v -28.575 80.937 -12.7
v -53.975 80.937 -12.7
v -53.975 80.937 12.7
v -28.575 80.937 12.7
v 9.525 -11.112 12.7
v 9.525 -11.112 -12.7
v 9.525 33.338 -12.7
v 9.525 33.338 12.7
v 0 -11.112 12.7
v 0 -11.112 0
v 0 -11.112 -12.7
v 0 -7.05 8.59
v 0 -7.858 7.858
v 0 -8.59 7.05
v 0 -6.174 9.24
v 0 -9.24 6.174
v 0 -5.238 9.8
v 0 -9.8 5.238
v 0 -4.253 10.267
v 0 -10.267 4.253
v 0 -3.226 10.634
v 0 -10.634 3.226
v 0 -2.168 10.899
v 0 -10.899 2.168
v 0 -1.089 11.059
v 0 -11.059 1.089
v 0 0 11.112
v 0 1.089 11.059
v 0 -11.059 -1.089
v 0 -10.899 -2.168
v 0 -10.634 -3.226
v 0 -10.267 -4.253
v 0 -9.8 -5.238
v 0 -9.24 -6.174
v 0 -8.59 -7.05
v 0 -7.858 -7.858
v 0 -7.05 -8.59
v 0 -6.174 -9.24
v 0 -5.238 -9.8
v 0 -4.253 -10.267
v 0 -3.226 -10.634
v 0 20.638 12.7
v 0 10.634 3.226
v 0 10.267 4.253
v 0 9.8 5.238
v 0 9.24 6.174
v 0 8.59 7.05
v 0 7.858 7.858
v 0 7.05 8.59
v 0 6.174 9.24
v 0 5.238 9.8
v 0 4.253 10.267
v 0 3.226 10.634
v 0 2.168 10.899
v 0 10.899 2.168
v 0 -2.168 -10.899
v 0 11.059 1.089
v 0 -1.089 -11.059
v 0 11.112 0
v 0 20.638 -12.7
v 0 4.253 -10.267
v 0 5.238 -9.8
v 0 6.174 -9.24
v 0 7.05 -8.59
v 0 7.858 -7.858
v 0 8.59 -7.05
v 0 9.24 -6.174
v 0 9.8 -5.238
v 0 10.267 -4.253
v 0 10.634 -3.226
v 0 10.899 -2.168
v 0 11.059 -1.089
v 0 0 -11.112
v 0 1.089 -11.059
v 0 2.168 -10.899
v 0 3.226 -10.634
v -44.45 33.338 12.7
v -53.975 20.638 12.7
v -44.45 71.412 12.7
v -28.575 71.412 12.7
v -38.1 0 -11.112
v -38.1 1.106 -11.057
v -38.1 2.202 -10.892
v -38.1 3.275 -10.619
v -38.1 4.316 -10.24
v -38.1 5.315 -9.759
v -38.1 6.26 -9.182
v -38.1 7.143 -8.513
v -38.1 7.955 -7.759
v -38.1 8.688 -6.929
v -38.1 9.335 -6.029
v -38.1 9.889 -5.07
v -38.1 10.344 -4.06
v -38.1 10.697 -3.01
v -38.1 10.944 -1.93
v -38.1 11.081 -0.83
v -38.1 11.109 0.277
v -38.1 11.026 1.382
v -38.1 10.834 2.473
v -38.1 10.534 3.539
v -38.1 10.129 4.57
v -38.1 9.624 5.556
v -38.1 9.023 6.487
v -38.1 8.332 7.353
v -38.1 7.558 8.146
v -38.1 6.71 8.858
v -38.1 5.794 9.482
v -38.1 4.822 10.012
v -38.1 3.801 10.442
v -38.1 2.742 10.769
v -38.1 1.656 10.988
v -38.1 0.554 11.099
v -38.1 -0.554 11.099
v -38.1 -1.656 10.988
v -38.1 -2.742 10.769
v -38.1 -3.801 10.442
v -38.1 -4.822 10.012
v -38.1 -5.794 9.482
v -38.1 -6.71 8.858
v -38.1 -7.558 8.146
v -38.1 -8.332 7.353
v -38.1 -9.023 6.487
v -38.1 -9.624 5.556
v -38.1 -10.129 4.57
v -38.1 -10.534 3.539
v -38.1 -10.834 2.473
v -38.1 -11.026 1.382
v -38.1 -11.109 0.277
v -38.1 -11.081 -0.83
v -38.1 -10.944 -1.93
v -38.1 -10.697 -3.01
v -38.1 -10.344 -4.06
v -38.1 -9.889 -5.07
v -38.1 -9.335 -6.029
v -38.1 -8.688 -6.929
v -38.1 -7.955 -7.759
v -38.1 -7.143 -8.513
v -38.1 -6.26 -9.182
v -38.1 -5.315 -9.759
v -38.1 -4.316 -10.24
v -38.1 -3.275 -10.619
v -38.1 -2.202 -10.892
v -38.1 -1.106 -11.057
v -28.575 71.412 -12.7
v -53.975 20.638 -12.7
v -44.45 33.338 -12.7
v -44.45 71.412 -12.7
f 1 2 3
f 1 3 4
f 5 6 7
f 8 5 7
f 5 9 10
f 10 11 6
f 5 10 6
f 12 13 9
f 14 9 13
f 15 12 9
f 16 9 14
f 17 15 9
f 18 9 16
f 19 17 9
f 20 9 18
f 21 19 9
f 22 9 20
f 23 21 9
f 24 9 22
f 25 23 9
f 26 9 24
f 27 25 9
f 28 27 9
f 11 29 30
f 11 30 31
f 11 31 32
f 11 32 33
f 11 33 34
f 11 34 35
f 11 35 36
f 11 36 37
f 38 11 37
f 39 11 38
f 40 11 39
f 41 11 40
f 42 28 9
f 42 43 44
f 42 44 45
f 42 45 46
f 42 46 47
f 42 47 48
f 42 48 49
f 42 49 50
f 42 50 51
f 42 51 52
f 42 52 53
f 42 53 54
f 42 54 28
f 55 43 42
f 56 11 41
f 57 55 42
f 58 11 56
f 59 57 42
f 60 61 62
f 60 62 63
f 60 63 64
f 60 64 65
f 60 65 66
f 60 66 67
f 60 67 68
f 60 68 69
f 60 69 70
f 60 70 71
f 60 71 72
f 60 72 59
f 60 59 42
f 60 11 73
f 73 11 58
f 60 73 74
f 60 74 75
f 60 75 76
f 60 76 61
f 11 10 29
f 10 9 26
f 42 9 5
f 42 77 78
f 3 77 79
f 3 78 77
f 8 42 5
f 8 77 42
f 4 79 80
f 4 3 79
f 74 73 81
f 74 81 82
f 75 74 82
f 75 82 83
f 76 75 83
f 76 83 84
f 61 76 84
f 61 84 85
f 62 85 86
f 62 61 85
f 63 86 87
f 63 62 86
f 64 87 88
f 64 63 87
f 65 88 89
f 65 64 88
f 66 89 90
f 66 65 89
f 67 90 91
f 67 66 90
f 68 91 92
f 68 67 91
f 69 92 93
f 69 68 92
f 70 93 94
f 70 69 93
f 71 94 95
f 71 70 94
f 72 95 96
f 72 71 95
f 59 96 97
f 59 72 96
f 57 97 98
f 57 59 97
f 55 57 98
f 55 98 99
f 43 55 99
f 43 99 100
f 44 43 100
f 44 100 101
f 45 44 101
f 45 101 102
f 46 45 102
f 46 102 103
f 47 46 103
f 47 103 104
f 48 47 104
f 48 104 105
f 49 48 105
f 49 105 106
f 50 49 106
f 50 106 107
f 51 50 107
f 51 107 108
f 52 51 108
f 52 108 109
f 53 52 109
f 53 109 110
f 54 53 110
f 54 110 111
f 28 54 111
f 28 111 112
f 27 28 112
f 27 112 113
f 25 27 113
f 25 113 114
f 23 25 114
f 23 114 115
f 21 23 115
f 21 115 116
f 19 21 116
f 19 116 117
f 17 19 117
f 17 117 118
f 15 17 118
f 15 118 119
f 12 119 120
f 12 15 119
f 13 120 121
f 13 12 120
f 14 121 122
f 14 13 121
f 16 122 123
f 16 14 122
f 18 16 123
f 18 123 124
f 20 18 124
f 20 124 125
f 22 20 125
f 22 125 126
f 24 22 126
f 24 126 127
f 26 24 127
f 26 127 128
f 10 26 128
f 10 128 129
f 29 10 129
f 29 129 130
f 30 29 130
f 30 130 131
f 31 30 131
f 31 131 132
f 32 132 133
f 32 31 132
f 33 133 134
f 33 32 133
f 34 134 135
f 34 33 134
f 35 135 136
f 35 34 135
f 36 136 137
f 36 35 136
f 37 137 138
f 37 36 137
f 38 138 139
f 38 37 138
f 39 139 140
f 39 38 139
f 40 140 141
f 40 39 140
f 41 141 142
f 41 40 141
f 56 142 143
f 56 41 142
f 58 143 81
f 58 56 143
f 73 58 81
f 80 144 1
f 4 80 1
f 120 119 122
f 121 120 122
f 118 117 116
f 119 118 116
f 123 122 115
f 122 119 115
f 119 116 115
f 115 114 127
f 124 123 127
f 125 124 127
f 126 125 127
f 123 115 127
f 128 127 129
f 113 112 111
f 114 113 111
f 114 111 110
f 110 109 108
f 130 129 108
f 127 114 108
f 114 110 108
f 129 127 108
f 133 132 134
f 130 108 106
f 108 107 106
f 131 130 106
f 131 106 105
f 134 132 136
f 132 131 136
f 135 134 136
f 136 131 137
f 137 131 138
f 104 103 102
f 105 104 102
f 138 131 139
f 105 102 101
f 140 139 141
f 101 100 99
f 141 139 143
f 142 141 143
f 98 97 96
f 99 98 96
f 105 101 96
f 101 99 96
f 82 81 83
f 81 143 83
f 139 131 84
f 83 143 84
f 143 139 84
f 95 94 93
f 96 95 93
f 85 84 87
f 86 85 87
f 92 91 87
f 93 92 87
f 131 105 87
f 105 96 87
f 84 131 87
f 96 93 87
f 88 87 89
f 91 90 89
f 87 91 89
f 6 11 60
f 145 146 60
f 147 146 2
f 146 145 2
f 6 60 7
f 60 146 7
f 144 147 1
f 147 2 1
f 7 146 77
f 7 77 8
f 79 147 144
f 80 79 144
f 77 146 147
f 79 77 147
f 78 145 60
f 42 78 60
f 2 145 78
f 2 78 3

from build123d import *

# Parameters (mm, degrees)
SKETCH1_R                = 11.1125
BOSS_EXTRUDE1_DEPTH      = 38.1
BOSS_EXTRUDE2_DEPTH      = 12.7
BOSS_EXTRUDE2_DEPTH_BACK = 12.7
SKETCH2_W                = 9.525
SKETCH2_H                = 31.75
BOSS_EXTRUDE3_DEPTH      = 12.7
BOSS_EXTRUDE3_DEPTH_BACK = 12.7
SKETCH3_W                = 63.5
SKETCH3_H                = 12.7
BOSS_EXTRUDE4_DEPTH      = 12.7
BOSS_EXTRUDE4_DEPTH_BACK = 12.7
SKETCH4_W                = 9.525
SKETCH4_H                = 60.2996
BOSS_EXTRUDE5_DEPTH      = 12.7
BOSS_EXTRUDE5_DEPTH_BACK = 12.7
SKETCH5_W                = 25.4
SKETCH5_H                = 9.525


with BuildPart() as part:
    # Sketch1 → Boss-Extrude1 (new body)
    with BuildSketch(Plane(origin=(0, 0, 0), x_dir=(0, 0, -1), z_dir=(1, 0, 0))):
        Circle(SKETCH1_R)
    extrude(amount=-BOSS_EXTRUDE1_DEPTH)

    # Sketch2 → Boss-Extrude2 (add, two sides: drawn at the far end of the back side and taken through both)
    with BuildSketch(Plane.XY.offset(-BOSS_EXTRUDE2_DEPTH_BACK)):
        with Locations((4.7625, 4.7625)):
            Rectangle(SKETCH2_W, SKETCH2_H)
    extrude(amount=BOSS_EXTRUDE2_DEPTH + BOSS_EXTRUDE2_DEPTH_BACK)

    # Sketch3 → Boss-Extrude3 (add, two sides: drawn at the far end of the back side and taken through both)
    with BuildSketch(Plane.XY.offset(-BOSS_EXTRUDE3_DEPTH_BACK)):
        with Locations((-22.225, 26.9875)):
            Rectangle(SKETCH3_W, SKETCH3_H)
    extrude(amount=BOSS_EXTRUDE3_DEPTH + BOSS_EXTRUDE3_DEPTH_BACK)

    # Sketch4 → Boss-Extrude4 (add, two sides: drawn at the far end of the back side and taken through both)
    with BuildSketch(Plane.XY.offset(-BOSS_EXTRUDE4_DEPTH_BACK)):
        with Locations((-49.2125, 50.7873)):
            Rectangle(SKETCH4_W, SKETCH4_H)
    extrude(amount=BOSS_EXTRUDE4_DEPTH + BOSS_EXTRUDE4_DEPTH_BACK)

    # Sketch5 → Boss-Extrude5 (add, two sides: drawn at the far end of the back side and taken through both)
    with BuildSketch(Plane.XY.offset(-BOSS_EXTRUDE5_DEPTH_BACK)):
        with Locations((-41.275, 76.1746)):
            Rectangle(SKETCH5_W, SKETCH5_H)
    extrude(amount=BOSS_EXTRUDE5_DEPTH + BOSS_EXTRUDE5_DEPTH_BACK)


solid = part.part
